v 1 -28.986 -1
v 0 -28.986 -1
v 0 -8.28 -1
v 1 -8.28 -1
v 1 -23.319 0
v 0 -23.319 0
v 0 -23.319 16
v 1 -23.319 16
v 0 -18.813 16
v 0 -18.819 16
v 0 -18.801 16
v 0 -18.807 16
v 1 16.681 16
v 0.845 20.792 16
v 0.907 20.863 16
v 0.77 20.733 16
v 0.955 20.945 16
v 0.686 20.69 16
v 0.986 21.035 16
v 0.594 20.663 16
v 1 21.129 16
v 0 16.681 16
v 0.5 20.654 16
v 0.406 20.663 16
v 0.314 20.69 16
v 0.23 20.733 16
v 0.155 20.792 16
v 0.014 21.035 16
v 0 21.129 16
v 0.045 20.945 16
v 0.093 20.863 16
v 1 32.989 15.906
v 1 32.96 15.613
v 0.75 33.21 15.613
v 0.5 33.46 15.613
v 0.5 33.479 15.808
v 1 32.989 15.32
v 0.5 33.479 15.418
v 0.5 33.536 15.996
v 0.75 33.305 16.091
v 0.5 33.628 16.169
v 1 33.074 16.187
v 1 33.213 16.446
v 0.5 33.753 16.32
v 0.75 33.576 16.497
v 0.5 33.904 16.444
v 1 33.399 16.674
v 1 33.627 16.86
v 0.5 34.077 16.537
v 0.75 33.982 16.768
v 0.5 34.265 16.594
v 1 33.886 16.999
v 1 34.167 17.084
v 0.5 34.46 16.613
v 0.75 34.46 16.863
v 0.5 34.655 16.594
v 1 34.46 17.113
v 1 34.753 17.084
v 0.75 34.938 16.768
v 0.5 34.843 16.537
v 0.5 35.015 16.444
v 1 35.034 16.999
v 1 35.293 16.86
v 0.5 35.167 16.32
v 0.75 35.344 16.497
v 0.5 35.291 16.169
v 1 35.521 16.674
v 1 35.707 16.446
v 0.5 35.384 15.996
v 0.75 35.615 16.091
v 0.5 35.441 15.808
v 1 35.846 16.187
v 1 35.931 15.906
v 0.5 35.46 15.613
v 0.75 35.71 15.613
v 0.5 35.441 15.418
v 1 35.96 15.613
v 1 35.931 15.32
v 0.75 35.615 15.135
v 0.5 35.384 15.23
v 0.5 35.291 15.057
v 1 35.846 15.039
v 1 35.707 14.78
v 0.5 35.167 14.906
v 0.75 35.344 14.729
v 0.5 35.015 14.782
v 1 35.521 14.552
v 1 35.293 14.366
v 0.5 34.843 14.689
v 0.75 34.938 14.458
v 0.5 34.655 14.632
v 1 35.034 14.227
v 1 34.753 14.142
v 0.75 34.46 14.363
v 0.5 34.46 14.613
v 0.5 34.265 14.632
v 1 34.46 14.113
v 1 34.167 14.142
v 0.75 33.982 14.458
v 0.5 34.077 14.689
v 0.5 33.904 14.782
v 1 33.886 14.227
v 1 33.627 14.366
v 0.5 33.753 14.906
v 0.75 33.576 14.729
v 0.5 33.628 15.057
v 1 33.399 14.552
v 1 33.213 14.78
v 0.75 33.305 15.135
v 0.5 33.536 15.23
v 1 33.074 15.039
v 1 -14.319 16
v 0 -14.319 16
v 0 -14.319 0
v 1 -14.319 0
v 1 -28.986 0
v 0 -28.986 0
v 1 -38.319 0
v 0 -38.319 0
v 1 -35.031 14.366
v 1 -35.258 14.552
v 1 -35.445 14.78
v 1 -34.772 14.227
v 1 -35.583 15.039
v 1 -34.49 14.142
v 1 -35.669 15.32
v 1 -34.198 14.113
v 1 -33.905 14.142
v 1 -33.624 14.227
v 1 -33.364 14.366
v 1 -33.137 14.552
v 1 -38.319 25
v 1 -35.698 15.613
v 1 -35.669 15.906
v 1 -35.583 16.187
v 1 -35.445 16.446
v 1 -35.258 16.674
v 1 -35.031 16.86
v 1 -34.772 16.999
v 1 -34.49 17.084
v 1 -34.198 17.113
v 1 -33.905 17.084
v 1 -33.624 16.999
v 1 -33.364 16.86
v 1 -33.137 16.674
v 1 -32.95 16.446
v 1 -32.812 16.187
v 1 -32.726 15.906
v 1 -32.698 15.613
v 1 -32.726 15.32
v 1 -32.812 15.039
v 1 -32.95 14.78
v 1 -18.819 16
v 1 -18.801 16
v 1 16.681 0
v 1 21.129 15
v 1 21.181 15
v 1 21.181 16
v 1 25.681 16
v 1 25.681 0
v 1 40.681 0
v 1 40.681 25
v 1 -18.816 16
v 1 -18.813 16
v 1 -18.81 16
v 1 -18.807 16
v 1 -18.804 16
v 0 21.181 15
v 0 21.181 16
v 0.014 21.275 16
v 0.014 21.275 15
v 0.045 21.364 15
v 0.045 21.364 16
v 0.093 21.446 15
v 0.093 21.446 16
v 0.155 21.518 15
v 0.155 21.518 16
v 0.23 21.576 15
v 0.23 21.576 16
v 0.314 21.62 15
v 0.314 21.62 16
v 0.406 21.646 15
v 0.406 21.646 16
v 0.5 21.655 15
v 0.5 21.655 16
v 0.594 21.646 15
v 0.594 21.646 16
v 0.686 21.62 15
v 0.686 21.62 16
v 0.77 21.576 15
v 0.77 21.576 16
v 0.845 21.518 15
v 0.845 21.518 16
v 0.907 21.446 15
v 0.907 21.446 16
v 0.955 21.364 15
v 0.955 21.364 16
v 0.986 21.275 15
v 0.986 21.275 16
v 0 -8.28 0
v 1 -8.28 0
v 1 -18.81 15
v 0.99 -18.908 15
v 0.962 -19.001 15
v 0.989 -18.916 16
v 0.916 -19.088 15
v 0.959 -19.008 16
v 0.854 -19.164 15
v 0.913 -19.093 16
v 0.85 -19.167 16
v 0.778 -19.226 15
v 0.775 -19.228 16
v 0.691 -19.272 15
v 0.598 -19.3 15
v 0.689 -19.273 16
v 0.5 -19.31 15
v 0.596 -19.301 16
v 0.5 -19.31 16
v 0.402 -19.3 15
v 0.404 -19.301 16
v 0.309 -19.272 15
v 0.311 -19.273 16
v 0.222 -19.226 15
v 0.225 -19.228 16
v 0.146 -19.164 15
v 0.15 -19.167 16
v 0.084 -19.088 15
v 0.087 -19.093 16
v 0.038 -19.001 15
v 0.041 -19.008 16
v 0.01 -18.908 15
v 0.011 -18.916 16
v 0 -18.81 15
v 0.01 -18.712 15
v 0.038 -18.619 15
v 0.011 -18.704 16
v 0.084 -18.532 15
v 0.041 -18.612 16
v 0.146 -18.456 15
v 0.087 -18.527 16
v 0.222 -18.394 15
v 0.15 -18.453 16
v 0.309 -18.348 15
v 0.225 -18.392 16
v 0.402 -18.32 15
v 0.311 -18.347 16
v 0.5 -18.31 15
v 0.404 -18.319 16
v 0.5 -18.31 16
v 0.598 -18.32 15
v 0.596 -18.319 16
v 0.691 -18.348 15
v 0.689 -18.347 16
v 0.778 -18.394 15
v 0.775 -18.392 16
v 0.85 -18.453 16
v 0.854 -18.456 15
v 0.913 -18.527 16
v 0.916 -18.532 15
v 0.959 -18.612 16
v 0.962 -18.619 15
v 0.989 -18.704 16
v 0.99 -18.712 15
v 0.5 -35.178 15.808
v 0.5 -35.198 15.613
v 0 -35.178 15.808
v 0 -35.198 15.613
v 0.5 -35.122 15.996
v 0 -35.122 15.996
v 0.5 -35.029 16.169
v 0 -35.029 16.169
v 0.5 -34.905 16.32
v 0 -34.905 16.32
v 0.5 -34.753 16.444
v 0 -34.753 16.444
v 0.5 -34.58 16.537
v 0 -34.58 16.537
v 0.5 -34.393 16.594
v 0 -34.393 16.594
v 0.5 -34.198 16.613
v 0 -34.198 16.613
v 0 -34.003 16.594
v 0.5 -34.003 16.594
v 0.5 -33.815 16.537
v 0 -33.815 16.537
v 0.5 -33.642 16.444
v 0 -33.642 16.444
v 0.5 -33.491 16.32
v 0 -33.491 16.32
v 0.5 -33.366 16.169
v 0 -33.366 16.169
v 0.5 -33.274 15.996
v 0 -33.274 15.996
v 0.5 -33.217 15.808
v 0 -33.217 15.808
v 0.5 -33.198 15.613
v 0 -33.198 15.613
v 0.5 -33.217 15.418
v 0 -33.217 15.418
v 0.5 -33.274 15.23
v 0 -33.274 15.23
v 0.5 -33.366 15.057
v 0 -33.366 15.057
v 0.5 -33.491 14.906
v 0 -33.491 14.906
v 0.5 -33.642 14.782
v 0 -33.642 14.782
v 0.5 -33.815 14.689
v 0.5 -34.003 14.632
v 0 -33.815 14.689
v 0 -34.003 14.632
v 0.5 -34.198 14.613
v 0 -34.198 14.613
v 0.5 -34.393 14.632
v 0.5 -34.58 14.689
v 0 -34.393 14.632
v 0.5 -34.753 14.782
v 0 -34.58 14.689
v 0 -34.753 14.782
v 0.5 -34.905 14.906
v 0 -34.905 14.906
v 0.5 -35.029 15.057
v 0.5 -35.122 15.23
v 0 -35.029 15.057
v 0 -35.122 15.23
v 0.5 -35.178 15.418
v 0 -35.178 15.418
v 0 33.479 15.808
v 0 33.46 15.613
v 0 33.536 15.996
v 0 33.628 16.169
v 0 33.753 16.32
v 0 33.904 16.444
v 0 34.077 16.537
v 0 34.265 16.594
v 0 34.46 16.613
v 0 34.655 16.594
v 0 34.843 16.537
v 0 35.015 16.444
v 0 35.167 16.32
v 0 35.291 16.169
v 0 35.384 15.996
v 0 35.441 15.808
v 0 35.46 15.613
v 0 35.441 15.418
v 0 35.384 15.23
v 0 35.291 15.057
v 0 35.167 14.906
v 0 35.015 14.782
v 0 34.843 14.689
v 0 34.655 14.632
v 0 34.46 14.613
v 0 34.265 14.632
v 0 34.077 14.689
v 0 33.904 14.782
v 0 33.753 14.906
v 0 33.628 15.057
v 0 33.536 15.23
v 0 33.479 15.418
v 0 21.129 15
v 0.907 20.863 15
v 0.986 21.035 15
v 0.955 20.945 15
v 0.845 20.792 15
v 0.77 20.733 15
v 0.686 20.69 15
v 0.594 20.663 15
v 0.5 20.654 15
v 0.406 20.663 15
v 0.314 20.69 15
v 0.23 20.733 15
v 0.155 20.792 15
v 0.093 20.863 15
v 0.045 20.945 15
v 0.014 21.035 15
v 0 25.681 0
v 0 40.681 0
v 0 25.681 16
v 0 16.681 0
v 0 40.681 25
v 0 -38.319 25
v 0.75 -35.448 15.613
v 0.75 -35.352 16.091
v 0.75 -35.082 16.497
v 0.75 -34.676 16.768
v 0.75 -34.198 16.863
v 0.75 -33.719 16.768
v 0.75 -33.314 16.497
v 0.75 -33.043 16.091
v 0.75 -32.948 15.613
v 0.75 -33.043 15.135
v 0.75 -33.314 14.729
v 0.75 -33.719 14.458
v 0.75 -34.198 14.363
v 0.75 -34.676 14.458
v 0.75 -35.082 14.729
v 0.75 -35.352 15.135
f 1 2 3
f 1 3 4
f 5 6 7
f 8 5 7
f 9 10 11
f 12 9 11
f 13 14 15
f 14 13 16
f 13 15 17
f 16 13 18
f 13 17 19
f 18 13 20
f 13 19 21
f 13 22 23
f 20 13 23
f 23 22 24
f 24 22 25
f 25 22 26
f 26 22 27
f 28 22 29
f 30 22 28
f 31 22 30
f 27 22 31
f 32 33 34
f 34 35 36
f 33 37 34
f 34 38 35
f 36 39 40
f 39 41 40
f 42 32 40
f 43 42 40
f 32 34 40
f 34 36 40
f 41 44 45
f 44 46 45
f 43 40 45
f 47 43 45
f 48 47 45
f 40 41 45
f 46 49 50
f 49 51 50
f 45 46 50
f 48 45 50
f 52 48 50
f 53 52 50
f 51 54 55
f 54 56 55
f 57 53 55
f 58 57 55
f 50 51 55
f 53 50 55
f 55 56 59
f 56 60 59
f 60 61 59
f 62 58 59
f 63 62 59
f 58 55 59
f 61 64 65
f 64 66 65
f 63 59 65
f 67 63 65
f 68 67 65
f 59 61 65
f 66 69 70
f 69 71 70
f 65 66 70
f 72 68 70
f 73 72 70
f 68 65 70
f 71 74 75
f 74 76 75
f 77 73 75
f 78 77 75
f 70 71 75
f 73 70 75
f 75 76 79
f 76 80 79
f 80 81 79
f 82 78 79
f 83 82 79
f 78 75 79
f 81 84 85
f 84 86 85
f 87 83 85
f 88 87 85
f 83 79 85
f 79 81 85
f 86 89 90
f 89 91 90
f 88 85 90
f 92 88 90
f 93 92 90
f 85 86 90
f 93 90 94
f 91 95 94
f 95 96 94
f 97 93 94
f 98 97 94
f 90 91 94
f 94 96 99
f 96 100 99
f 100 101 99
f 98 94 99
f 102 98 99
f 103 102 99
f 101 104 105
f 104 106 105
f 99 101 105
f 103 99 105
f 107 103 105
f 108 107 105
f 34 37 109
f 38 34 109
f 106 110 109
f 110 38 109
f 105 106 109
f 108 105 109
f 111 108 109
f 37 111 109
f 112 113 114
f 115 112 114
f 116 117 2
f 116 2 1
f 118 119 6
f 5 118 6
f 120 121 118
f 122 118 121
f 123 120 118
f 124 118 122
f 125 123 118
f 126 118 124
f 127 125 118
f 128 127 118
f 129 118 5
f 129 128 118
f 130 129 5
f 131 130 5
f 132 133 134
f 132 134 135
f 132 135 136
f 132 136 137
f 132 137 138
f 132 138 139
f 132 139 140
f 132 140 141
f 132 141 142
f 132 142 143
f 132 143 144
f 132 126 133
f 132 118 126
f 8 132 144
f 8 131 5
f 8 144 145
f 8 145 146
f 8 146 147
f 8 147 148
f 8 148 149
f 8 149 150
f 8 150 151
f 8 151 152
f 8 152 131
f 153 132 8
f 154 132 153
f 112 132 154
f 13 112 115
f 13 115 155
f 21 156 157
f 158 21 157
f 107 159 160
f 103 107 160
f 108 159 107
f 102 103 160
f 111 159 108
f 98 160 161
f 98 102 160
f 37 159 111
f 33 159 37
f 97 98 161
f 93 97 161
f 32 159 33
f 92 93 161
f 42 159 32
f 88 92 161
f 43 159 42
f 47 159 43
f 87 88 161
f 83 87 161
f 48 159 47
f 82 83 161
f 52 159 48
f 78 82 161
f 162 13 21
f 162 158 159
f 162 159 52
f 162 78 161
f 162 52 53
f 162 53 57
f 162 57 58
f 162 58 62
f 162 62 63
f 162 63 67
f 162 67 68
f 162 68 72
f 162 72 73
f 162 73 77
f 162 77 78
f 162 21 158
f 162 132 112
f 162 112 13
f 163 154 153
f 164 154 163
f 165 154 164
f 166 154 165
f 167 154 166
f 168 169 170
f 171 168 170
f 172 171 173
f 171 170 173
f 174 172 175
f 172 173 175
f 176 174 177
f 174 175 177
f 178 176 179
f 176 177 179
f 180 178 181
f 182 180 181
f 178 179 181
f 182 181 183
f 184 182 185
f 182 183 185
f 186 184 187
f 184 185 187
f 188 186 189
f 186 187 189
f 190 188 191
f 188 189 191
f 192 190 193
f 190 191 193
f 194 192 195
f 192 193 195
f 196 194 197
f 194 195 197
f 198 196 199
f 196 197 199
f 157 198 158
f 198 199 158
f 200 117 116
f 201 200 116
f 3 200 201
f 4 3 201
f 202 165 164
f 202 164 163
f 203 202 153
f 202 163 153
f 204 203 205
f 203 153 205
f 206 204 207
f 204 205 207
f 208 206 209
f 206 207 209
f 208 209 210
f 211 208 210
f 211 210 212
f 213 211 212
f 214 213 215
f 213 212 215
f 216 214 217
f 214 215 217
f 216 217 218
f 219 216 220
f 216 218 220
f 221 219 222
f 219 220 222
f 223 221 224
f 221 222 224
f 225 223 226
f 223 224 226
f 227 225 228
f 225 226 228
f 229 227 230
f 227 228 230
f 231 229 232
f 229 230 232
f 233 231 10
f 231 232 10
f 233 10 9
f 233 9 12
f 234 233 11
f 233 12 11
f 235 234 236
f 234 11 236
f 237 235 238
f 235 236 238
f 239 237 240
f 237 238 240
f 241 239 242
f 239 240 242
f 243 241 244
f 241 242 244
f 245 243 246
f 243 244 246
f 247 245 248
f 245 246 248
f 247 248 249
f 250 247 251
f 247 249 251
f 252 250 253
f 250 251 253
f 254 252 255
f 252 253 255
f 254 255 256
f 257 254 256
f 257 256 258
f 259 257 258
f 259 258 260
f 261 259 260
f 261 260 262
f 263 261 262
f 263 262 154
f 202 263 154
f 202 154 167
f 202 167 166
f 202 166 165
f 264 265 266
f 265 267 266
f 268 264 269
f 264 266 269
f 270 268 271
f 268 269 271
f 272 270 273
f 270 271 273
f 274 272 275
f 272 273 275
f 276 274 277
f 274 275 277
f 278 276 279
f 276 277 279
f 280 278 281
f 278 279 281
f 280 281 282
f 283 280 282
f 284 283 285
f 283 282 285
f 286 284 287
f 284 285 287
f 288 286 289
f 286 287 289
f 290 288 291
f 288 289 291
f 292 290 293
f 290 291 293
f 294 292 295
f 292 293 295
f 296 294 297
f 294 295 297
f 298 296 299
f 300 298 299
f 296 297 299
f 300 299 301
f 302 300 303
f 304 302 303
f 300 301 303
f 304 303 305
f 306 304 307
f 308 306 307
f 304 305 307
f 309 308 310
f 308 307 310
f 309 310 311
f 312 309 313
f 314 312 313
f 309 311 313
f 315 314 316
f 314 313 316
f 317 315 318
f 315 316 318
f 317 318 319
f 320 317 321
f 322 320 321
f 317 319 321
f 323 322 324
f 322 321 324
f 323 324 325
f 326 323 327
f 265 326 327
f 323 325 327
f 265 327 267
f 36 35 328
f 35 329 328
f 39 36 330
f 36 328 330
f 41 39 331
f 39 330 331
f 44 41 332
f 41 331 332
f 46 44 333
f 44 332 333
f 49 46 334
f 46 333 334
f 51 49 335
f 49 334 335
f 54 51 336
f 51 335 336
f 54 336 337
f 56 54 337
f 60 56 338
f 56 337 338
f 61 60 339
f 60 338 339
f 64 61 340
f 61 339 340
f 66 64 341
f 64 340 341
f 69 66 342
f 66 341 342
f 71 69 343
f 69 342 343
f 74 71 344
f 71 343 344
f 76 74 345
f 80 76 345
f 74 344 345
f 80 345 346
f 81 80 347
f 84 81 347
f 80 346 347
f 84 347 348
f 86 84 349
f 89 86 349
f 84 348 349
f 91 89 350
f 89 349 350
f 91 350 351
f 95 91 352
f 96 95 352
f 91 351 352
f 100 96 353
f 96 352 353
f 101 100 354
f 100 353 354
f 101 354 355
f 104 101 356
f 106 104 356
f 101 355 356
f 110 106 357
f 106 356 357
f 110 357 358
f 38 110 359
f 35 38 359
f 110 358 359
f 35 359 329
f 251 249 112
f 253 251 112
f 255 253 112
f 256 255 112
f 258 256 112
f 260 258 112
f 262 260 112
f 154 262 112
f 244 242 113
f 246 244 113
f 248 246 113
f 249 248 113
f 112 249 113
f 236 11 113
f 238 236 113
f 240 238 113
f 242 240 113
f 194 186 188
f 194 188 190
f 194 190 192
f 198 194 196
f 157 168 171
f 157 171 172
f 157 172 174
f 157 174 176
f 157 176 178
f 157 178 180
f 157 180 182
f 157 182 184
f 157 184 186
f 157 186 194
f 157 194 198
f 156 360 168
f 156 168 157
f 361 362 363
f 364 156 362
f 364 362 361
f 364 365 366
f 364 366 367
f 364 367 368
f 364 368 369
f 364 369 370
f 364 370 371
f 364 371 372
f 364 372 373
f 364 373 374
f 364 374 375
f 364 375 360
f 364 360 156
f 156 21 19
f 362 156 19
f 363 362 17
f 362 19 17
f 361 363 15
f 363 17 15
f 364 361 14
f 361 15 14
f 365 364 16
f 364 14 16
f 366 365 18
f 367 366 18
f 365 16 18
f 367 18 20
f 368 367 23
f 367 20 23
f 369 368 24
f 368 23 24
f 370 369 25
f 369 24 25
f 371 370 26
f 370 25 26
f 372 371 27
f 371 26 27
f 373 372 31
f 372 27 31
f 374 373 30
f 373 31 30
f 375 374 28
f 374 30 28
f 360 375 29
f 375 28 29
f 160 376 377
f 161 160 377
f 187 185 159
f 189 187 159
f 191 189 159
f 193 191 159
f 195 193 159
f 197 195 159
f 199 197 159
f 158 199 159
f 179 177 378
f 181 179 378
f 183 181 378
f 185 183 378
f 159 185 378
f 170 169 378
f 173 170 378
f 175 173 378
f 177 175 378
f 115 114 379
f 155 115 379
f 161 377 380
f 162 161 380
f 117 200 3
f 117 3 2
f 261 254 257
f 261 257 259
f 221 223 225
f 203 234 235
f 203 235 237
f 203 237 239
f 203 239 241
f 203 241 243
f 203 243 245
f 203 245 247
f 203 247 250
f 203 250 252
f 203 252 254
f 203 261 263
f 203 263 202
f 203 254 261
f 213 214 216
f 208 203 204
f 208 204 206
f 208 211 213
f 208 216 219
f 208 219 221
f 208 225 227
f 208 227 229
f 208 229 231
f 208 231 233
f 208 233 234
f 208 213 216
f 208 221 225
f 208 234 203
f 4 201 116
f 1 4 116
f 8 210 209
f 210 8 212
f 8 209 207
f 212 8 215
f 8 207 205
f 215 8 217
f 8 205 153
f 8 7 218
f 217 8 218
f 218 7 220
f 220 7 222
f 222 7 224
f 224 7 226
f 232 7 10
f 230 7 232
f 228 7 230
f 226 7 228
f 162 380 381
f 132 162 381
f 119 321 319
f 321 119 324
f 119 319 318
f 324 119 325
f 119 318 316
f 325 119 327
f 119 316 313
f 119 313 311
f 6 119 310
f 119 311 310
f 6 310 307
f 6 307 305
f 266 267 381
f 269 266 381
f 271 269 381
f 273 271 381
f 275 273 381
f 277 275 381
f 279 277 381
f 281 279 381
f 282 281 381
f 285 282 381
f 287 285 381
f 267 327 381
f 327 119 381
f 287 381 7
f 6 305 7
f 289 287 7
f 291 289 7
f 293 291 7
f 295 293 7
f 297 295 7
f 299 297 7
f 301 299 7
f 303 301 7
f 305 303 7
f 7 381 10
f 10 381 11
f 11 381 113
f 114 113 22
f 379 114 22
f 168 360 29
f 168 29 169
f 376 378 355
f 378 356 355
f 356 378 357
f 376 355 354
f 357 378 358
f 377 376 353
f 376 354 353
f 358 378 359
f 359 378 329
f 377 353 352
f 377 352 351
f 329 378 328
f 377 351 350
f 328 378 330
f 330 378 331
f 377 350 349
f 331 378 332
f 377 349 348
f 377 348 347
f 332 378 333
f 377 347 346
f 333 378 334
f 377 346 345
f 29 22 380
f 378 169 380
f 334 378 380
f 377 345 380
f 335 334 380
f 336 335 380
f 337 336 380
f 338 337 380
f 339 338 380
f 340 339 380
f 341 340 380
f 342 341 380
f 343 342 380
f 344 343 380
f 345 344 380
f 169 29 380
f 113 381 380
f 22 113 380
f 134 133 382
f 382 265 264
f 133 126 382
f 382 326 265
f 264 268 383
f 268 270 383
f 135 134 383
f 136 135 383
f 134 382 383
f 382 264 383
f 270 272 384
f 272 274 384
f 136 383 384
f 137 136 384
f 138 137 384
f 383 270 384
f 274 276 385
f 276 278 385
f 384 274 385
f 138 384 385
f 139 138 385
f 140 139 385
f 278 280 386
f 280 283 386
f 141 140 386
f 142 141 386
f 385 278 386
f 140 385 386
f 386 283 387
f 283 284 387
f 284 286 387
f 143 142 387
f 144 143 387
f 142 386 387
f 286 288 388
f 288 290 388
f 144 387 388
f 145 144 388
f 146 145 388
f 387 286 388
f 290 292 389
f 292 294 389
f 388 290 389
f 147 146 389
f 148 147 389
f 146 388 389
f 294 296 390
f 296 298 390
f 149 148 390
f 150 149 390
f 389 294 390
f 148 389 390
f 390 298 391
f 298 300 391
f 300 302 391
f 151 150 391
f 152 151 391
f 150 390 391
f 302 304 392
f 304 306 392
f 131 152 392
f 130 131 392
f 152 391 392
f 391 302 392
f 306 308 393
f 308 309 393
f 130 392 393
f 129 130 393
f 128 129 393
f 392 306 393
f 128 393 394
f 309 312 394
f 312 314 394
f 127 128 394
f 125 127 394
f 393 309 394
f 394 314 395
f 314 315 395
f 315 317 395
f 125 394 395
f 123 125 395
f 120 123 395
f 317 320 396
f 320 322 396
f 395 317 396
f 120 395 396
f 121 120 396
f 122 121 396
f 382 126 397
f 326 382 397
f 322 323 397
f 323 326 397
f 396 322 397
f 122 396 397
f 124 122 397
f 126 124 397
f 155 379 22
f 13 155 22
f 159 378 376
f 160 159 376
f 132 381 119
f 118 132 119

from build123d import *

# Parameters (mm, degrees)
F1_DEPTH       = 1
F3_D           = 2
F3_CSINK_D     = 3
F3_CSINK_ANGLE = 90
F5_DEPTH       = 1
F7_DEPTH       = 1
F8_W           = 1
F8_H           = 20.7052147016
F9_DEPTH       = 1


with BuildPart() as f1:
    # F0 (on Right) → F1 (new body)
    with BuildSketch(Plane.YZ):
        Polygon((40.680675586, 25), (-38.319324414, 25), (-38.319324414, 0), (-23.319324414, 0), (-23.319324414, 16), (-14.319324414, 16), (-14.319324414, 0), (16.680675586, 0), (16.680675586, 16), (25.680675586, 16), (25.680675586, 0), (40.680675586, 0), align=None)
    extrude(amount=F1_DEPTH)

    # F3 (through all)
    with Locations(Plane.YZ.offset(1)):
        with Locations((-34.1976433992, 15.6130259857), (34.4599224627, 15.6130259857)):
            CounterSinkHole(F3_D / 2, F3_CSINK_D / 2, counter_sink_angle=F3_CSINK_ANGLE)

    # F4 (on face) → F5 (join)
    with BuildSketch(Plane(origin=(0, 0, 16), x_dir=(1, 0, 0), z_dir=(0, 0, -1))):
        with BuildLine():
            ThreePointArc((-8.68652e-05, 18.8100038602), (0.5, 18.309916995), (1.0000868652, 18.8100038602))
            ThreePointArc((1.0000868652, 18.8100038602), (0.5, 19.3100907254), (-8.68652e-05, 18.8100038602))
        make_face()
    extrude(amount=F5_DEPTH)

    # F6 (on face) → F7 (join)
    with BuildSketch(Plane(origin=(0, 0, 16), x_dir=(1, 0, 0), z_dir=(0, 0, -1))):
        with BuildLine():
            Line((1, -21.180675586), (1, -21.1288443983))
            ThreePointArc((1, -21.1288443983), (0.5, -20.6540888246), (0, -21.1288443983))
            Line((0, -21.1288443983), (0, -21.180675586))
            ThreePointArc((0, -21.180675586), (0.5, -21.6554311597), (1, -21.180675586))
        make_face()
    extrude(amount=F7_DEPTH)


with BuildPart() as f9:
    # F8 (on face) → F9 (new body)
    with BuildSketch(Plane(origin=(0, 0, 0), x_dir=(1, 0, 0), z_dir=(0, 0, -1))):
        with Locations((0.5, 18.6329078861)):
            Rectangle(F8_W, F8_H)
    extrude(amount=F9_DEPTH)


solid = Compound([f1.part, f9.part])
